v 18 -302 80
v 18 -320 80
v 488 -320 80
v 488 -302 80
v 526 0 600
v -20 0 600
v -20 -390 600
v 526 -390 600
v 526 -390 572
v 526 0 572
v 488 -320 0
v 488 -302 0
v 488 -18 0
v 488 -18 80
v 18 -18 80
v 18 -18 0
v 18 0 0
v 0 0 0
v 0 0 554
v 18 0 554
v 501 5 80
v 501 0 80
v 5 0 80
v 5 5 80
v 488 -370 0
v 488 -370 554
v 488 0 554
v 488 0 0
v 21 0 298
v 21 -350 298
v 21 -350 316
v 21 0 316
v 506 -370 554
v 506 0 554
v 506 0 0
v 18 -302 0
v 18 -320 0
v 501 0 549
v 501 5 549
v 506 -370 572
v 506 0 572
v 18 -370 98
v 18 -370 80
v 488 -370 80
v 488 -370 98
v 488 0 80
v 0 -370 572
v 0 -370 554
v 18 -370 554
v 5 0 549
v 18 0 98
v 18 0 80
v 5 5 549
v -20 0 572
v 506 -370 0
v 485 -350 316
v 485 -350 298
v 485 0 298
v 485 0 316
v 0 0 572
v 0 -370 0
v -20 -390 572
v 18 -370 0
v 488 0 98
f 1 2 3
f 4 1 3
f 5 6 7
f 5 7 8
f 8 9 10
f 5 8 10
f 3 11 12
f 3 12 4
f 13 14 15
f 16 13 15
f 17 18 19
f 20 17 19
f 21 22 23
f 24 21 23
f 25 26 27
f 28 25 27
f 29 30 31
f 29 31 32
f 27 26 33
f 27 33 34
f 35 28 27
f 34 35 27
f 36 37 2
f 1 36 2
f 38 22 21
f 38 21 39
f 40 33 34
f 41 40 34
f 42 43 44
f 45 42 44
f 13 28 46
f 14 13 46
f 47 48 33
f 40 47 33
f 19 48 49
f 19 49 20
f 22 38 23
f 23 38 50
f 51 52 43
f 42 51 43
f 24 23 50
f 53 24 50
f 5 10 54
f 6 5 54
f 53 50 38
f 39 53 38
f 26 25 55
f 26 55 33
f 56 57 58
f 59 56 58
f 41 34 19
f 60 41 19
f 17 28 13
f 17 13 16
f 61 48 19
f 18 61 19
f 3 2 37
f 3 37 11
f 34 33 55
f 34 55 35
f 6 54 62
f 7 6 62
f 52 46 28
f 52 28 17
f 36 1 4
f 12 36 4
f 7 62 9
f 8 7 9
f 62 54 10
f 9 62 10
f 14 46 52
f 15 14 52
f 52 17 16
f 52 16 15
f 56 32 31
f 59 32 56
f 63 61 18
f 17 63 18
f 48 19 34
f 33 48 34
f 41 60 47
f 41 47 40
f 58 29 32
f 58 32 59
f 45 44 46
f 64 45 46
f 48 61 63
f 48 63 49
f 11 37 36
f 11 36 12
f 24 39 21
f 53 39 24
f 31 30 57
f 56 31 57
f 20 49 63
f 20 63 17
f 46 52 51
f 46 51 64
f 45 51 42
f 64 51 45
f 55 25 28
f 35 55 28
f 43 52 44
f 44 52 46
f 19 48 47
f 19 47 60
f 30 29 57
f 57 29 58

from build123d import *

# Parameters (mm, degrees)
F2_W      = 370
F2_H      = 554
F3_DEPTH  = 18
F5_W      = 370
F5_H      = 554
F6_DEPTH  = 18
F9_W      = 470
F9_H      = 80
F10_DEPTH = 18
F11_W     = 470
F11_H     = 80
F12_DEPTH = 18
F13_W     = 470
F13_H     = 352
F13_H_2   = 18
F14_DEPTH = 18
F15_W     = 488
F15_H     = 370
F15_W_2   = 18
F16_DEPTH = 18
F17_W     = 506
F17_H     = 370
F18_DEPTH = 28
F20_W     = 464
F20_H     = 350
F21_DEPTH = 18
F23_W     = 13
F23_H     = 469
F23_W_2   = 483
F24_DEPTH = 5


with BuildPart() as f3:
    # F2 (on Right) → F3 (new body)
    with BuildSketch(Plane.YZ):
        with Locations((-185, 277)):
            Rectangle(F2_W, F2_H)
    extrude(amount=F3_DEPTH)


with BuildPart() as f6:
    # F5 (on offset) → F6 (new body)
    with BuildSketch(Plane.YZ.offset(488)):
        with Locations((-185, 277)):
            Rectangle(F5_W, F5_H)
    extrude(amount=F6_DEPTH)


with BuildPart() as f10:
    # F9 (on offset) → F10 (new body)
    with BuildSketch(Plane.XZ.offset(320)):
        with Locations((253, 40)):
            Rectangle(F9_W, F9_H)
    extrude(amount=-F10_DEPTH)


with BuildPart() as f12:
    # F11 (on face) → F12 (new body)
    with BuildSketch(Plane(origin=(0, 0, 0), x_dir=(-1, 0, 0), z_dir=(0, 1, 0))):
        with Locations((-253, 40)):
            Rectangle(F11_W, F11_H)
    extrude(amount=-F12_DEPTH)


with BuildPart() as f14:
    # F13 (on face) → F14 (new body)
    with BuildSketch(Plane.XY.offset(80)):
        with Locations((253, -194)):
            Rectangle(F13_W, F13_H)
        with Locations((253, -9)):
            Rectangle(F13_W, F13_H_2)
    extrude(amount=F14_DEPTH)


with BuildPart() as f16:
    # F15 (on face) → F16 (new body)
    with BuildSketch(Plane.XY.offset(554)):
        with Locations((262, -185)):
            Rectangle(F15_W, F15_H)
        with Locations((9, -185)):
            Rectangle(F15_W_2, F15_H)
    extrude(amount=F16_DEPTH)


with BuildPart() as f18:
    # F17 (on face) → F18 (new body)
    with BuildSketch(Plane.XY.offset(572)):
        with Locations((253, -185)):
            Rectangle(F17_W, F17_H)
        Polygon((0, 0), (-20, 0), (-20, -390), (526, -390), (526, 0), (506, 0), (506, -370), (0, -370), align=None)
    extrude(amount=F18_DEPTH)


with BuildPart() as f21:
    # F20 (on offset) → F21 (new body)
    with BuildSketch(Plane.XY.offset(298)):
        with Locations((253, -175)):
            Rectangle(F20_W, F20_H)
    extrude(amount=F21_DEPTH)


with BuildPart() as f24:
    # F23 (on face) → F24 (new body)
    with BuildSketch(Plane(origin=(0, 0, 0), x_dir=(-1, 0, 0), z_dir=(0, 1, 0))):
        with Locations((-11.5, 314.5)):
            Rectangle(F23_W, F23_H)
        with Locations((-259.5, 314.5)):
            Rectangle(F23_W_2, F23_H)
    extrude(amount=F24_DEPTH)


solid = Compound([f3.part, f6.part, f10.part, f12.part, f14.part, f16.part, f18.part, f21.part, f24.part])
